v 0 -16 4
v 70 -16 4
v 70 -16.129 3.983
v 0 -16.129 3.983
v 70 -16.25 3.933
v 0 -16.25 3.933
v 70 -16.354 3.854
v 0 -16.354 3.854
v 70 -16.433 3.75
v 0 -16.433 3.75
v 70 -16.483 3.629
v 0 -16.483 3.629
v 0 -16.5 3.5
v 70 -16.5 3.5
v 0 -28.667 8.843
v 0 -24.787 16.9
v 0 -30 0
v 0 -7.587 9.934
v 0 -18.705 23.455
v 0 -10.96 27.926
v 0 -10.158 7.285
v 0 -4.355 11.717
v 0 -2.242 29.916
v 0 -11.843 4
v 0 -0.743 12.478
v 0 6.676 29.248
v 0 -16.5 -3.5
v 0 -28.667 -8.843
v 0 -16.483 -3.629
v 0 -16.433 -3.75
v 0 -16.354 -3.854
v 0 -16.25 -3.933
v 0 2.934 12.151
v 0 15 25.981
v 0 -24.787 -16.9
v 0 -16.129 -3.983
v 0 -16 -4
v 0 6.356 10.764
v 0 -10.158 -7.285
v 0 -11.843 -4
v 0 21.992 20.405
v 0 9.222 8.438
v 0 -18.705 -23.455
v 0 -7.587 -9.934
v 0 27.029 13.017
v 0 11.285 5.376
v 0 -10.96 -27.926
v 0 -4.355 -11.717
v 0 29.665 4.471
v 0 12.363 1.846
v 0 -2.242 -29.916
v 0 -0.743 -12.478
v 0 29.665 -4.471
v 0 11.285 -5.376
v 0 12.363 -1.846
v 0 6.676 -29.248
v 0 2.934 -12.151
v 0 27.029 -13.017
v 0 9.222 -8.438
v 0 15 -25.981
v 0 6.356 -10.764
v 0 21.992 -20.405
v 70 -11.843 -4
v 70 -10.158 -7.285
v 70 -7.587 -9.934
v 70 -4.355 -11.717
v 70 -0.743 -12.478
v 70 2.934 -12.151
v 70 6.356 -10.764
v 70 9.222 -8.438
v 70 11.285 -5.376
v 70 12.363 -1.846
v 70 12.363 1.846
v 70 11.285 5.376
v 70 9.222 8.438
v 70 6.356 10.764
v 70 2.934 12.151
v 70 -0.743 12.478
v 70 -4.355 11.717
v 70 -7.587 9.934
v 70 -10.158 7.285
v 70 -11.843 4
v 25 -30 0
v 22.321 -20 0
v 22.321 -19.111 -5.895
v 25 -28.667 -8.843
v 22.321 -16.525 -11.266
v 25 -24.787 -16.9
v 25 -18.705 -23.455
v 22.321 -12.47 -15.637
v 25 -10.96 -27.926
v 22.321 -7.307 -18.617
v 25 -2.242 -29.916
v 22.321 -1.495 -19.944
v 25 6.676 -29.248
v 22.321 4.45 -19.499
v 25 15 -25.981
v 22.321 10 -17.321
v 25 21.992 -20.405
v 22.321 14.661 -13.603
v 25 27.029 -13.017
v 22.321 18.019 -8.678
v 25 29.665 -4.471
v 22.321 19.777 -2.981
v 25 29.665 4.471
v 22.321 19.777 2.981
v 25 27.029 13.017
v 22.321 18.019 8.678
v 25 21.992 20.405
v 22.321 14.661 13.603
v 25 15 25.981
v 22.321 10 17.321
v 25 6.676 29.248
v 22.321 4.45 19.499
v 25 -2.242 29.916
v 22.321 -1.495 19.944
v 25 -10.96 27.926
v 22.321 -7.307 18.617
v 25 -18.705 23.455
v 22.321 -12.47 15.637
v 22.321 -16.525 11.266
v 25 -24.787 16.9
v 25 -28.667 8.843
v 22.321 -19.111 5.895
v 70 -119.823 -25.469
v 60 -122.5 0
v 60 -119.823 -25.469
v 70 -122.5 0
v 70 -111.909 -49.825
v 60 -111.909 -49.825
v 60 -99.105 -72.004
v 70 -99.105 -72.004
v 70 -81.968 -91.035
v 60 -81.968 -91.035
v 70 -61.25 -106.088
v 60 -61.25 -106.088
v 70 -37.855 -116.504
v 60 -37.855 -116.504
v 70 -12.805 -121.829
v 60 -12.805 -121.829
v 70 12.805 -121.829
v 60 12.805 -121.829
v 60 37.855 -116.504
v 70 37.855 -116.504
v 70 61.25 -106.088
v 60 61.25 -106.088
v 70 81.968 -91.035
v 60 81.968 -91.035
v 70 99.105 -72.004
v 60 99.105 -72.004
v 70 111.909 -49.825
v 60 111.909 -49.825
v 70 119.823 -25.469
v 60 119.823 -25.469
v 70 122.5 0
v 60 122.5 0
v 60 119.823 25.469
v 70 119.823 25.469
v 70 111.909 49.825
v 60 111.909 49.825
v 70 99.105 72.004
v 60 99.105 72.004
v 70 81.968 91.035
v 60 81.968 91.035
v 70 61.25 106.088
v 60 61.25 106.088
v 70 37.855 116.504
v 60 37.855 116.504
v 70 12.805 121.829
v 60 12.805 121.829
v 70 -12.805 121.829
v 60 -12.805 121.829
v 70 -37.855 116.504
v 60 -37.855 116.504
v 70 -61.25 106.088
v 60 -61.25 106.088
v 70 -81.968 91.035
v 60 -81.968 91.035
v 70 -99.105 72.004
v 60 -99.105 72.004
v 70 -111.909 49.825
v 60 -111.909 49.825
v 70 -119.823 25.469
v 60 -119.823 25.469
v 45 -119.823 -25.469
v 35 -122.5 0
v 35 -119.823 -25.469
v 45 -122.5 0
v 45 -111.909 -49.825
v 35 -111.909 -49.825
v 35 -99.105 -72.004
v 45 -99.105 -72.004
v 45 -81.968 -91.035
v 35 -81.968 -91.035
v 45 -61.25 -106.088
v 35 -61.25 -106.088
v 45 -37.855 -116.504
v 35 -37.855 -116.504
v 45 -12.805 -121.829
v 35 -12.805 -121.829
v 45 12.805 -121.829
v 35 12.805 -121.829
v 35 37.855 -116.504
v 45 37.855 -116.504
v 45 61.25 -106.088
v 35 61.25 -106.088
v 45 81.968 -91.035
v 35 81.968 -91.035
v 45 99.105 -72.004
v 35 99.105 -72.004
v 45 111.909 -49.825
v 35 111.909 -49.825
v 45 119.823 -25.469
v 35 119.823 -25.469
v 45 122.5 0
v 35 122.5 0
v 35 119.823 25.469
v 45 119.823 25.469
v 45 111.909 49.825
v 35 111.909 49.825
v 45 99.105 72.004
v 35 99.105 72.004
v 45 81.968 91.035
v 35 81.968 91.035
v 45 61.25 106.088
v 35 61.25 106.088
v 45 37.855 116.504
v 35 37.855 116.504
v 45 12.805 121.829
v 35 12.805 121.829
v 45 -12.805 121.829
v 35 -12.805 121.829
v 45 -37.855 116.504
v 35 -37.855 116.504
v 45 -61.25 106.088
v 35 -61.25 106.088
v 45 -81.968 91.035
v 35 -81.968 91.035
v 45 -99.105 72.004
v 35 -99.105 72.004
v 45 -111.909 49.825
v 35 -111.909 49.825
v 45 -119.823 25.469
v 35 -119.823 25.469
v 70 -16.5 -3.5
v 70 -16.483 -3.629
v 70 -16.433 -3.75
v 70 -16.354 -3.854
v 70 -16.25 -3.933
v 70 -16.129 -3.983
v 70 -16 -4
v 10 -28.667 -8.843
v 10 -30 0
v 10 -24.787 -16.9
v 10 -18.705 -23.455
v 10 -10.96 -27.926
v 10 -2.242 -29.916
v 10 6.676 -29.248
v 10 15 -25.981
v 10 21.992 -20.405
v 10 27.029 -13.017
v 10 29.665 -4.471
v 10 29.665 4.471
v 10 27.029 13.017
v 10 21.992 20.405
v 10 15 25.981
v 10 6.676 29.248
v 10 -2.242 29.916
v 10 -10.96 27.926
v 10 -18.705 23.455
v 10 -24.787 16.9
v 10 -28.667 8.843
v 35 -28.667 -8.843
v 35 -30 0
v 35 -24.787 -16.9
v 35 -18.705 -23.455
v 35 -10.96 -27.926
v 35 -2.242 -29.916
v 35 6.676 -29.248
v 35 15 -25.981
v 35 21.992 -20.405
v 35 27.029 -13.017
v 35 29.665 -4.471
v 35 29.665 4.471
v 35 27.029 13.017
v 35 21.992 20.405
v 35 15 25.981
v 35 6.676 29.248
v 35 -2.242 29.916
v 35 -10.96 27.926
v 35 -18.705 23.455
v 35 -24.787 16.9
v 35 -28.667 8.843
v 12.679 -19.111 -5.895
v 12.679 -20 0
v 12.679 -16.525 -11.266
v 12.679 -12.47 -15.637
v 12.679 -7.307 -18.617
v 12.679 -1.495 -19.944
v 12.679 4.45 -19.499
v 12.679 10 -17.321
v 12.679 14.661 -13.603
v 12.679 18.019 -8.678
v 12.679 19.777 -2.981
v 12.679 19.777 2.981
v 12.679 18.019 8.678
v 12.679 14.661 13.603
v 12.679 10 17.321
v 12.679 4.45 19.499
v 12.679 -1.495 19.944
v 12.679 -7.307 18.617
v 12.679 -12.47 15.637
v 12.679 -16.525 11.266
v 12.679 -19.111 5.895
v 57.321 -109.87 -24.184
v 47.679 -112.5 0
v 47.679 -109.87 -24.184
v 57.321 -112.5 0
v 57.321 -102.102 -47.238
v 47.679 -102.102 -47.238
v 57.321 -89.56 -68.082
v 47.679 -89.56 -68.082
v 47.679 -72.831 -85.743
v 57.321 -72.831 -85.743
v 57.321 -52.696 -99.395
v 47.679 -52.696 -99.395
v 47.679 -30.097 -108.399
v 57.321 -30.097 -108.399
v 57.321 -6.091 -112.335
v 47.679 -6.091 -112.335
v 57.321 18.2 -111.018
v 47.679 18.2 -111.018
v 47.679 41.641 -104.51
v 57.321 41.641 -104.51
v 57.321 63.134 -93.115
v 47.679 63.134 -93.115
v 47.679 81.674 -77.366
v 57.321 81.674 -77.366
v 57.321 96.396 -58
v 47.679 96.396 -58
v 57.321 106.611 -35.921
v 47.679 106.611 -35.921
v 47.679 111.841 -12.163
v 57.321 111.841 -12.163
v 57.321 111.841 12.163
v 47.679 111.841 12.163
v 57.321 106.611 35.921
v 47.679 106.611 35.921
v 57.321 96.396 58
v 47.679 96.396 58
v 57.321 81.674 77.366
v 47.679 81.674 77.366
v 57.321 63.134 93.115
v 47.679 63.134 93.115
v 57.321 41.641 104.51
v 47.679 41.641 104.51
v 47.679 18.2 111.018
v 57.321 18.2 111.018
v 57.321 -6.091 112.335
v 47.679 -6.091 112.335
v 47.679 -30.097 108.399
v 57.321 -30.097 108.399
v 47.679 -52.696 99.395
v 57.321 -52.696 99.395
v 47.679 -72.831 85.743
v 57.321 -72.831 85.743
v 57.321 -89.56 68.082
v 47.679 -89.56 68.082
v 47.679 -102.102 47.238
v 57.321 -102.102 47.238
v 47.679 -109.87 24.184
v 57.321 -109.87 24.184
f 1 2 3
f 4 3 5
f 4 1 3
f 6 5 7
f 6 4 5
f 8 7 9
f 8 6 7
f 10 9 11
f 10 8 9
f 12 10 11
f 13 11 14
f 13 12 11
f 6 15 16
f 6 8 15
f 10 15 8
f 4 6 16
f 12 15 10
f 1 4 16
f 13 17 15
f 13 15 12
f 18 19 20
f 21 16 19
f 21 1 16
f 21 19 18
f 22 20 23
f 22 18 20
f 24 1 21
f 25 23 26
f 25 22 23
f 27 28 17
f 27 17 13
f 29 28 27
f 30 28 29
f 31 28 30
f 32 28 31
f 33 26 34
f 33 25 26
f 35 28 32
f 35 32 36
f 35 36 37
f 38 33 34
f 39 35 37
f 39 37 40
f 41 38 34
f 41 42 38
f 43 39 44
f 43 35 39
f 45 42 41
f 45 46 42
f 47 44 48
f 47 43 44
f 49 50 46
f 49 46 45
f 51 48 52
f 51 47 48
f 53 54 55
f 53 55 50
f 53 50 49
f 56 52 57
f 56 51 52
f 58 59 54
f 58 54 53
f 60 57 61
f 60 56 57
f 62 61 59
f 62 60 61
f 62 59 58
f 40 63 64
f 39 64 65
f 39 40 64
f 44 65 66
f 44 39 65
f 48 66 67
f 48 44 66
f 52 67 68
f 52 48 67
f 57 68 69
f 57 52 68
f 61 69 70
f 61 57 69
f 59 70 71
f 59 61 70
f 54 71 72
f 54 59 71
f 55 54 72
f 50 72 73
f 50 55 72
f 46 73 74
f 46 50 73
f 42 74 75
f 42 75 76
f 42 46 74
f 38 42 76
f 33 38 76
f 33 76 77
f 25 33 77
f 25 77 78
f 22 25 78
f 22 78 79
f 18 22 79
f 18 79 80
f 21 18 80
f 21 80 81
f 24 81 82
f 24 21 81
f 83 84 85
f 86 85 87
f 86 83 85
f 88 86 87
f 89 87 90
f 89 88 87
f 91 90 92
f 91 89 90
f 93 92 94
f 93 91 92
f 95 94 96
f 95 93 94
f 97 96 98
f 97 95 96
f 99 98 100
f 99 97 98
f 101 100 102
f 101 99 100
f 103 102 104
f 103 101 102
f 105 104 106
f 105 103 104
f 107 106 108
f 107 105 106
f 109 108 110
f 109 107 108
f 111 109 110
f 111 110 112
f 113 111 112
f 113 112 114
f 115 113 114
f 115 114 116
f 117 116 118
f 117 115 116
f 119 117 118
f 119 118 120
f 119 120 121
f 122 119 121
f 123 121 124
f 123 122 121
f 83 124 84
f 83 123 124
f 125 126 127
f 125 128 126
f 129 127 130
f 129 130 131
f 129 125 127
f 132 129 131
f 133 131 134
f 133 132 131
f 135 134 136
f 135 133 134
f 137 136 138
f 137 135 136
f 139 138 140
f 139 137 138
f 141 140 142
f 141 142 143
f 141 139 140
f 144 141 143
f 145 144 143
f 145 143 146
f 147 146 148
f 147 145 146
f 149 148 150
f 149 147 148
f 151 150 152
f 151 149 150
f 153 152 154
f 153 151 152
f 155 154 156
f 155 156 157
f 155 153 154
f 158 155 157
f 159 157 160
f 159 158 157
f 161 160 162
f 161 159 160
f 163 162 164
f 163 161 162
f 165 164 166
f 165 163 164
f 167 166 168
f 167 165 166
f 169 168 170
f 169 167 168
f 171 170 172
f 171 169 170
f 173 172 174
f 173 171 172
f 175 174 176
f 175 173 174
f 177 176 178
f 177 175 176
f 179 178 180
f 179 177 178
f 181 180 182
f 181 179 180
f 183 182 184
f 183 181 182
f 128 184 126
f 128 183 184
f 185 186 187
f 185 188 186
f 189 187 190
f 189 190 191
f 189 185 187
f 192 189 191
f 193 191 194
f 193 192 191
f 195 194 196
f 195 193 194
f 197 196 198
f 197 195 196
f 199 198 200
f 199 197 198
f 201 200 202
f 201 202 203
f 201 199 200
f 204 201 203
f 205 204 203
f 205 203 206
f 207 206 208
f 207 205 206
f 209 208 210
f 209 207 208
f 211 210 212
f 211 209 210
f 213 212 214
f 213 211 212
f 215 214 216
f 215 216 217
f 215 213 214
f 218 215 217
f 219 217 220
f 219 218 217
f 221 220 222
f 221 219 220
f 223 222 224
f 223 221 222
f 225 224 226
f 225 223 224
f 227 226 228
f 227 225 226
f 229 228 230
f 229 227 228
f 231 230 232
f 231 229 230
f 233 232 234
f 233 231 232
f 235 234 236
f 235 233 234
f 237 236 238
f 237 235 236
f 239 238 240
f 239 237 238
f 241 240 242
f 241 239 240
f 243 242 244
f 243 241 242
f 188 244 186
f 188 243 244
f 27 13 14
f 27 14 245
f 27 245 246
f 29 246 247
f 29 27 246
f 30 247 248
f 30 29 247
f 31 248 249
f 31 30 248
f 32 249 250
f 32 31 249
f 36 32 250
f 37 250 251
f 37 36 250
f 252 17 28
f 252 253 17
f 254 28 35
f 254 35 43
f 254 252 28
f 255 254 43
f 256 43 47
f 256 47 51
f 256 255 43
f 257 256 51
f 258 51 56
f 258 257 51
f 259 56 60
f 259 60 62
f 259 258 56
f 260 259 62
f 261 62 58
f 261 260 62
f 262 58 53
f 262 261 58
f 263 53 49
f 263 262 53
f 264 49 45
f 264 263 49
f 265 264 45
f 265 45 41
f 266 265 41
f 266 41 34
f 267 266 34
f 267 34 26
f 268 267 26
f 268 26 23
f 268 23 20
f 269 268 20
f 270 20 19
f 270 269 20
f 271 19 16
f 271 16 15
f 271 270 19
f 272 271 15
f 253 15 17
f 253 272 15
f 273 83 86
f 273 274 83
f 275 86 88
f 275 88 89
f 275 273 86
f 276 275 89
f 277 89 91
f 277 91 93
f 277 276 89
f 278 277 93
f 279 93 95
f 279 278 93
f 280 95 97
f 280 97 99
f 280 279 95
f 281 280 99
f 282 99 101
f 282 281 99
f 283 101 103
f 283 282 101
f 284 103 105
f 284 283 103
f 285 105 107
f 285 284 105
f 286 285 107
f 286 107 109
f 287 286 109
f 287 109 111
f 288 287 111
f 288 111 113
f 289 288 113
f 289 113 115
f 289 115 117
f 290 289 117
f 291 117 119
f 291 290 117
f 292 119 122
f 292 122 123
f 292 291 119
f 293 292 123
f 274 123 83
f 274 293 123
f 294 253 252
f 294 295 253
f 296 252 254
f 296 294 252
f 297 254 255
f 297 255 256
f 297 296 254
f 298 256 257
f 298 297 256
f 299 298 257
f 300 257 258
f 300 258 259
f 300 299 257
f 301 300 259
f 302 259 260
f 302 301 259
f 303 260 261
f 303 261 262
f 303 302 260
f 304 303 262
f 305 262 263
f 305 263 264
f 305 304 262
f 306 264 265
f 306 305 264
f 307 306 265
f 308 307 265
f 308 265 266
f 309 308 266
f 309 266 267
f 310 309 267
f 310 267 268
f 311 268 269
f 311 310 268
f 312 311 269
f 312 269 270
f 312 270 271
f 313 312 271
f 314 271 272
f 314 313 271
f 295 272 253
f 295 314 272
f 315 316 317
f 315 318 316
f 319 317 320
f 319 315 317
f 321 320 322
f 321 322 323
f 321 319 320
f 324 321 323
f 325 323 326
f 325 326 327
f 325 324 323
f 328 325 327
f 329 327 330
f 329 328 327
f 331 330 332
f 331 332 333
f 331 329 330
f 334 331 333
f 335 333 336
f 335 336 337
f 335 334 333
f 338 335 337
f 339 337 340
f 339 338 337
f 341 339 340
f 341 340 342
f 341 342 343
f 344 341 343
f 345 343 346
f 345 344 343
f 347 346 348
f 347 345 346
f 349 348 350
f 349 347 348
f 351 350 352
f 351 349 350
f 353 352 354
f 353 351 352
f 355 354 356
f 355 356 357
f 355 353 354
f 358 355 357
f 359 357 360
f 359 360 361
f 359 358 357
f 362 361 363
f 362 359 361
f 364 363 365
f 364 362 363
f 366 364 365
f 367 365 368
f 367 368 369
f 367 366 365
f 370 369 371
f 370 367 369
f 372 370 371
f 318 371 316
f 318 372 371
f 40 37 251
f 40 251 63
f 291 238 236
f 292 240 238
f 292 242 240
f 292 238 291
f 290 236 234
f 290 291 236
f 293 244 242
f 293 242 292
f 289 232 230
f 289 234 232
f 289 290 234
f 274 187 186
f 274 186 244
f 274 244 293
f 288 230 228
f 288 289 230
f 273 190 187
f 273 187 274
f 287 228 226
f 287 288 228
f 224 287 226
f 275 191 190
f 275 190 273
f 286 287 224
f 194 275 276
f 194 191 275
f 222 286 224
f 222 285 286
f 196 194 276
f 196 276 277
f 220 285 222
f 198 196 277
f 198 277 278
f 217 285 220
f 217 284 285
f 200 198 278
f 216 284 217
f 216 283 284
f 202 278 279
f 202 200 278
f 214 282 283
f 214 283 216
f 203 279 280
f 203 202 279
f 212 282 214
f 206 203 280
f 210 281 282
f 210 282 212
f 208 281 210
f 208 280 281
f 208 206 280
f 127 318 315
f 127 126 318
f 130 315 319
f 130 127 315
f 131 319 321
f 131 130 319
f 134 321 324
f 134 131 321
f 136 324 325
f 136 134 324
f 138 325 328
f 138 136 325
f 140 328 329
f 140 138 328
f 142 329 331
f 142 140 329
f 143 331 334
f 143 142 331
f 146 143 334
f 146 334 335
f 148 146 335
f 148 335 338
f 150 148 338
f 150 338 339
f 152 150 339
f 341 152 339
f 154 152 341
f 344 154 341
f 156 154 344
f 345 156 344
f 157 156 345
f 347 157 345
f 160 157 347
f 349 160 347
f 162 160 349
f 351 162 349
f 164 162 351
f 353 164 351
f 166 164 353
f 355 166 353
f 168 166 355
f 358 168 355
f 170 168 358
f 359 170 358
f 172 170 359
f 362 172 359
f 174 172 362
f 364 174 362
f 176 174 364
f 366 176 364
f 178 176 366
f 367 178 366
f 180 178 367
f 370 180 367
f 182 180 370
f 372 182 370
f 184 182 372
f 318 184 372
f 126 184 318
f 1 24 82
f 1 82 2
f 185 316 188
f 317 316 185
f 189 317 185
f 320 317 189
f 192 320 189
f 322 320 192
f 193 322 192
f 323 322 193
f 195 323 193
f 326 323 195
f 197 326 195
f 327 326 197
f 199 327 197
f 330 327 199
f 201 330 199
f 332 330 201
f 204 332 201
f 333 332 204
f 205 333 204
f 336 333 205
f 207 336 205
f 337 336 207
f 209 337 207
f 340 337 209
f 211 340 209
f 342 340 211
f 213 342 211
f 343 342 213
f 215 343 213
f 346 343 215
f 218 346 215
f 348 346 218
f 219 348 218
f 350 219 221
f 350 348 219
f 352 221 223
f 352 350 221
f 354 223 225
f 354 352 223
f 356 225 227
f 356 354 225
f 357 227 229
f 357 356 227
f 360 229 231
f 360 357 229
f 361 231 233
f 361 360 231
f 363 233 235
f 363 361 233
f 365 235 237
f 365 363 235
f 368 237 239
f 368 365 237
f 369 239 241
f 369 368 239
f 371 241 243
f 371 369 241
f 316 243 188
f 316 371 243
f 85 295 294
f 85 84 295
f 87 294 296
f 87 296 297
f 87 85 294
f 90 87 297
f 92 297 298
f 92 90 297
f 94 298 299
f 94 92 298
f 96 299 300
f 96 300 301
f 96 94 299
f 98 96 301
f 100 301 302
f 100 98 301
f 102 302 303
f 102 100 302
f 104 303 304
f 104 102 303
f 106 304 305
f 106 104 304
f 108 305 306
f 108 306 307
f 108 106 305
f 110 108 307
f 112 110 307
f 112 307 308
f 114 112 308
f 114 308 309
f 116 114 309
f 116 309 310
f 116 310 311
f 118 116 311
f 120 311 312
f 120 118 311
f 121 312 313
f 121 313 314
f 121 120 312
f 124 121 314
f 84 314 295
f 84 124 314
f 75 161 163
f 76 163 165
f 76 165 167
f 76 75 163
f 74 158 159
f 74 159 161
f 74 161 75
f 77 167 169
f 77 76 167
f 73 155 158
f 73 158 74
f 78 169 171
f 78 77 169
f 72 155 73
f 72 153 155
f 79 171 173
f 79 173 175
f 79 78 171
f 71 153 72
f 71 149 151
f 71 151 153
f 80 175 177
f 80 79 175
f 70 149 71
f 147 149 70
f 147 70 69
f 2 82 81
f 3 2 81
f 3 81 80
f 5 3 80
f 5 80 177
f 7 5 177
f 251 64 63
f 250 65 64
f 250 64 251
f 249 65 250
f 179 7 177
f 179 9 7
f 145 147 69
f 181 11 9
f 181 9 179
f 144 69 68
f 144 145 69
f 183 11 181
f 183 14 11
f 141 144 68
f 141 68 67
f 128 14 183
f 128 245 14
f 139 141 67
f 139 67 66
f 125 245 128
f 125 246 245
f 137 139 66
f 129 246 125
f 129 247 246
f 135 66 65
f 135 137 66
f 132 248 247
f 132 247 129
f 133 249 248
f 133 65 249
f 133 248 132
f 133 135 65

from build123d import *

# Parameters (mm, degrees)
CORTE_EXTRUS_O1_DEPTH = 71


with BuildPart() as part:
    # Sketch1 → Revolve1 (revolve)
    with BuildSketch(Plane.XY):
        Polygon((70, -12.5), (0, -12.5), (0, -30), (10, -30), (12.679491924, -20), (22.320508076, -20), (25, -30), (35, -30), (35, -122.5), (45, -122.5), (47.679491924, -112.5), (57.320508076, -112.5), (60, -122.5), (70, -122.5), align=None)
    revolve(axis=Axis((0, 0, 0), (1, 0, 0)))

    # Esboço1 → Corte-extrusão1 (cut, through all)
    with BuildSketch(Plane.ZY):
        with BuildLine():
            Line((3.5, -16.5), (-3.5, -16.5))
            ThreePointArc((-3.5, -16.5), (-3.853553391, -16.353553391), (-4, -16))
            Line((-4, -16), (-4, -8.5))
            Line((-4, -8.5), (4, -8.5))
            Line((4, -8.5), (4, -16))
            ThreePointArc((4, -16), (3.853553391, -16.353553391), (3.5, -16.5))
        make_face()
    extrude(amount=-CORTE_EXTRUS_O1_DEPTH, mode=Mode.SUBTRACT)


solid = part.part
